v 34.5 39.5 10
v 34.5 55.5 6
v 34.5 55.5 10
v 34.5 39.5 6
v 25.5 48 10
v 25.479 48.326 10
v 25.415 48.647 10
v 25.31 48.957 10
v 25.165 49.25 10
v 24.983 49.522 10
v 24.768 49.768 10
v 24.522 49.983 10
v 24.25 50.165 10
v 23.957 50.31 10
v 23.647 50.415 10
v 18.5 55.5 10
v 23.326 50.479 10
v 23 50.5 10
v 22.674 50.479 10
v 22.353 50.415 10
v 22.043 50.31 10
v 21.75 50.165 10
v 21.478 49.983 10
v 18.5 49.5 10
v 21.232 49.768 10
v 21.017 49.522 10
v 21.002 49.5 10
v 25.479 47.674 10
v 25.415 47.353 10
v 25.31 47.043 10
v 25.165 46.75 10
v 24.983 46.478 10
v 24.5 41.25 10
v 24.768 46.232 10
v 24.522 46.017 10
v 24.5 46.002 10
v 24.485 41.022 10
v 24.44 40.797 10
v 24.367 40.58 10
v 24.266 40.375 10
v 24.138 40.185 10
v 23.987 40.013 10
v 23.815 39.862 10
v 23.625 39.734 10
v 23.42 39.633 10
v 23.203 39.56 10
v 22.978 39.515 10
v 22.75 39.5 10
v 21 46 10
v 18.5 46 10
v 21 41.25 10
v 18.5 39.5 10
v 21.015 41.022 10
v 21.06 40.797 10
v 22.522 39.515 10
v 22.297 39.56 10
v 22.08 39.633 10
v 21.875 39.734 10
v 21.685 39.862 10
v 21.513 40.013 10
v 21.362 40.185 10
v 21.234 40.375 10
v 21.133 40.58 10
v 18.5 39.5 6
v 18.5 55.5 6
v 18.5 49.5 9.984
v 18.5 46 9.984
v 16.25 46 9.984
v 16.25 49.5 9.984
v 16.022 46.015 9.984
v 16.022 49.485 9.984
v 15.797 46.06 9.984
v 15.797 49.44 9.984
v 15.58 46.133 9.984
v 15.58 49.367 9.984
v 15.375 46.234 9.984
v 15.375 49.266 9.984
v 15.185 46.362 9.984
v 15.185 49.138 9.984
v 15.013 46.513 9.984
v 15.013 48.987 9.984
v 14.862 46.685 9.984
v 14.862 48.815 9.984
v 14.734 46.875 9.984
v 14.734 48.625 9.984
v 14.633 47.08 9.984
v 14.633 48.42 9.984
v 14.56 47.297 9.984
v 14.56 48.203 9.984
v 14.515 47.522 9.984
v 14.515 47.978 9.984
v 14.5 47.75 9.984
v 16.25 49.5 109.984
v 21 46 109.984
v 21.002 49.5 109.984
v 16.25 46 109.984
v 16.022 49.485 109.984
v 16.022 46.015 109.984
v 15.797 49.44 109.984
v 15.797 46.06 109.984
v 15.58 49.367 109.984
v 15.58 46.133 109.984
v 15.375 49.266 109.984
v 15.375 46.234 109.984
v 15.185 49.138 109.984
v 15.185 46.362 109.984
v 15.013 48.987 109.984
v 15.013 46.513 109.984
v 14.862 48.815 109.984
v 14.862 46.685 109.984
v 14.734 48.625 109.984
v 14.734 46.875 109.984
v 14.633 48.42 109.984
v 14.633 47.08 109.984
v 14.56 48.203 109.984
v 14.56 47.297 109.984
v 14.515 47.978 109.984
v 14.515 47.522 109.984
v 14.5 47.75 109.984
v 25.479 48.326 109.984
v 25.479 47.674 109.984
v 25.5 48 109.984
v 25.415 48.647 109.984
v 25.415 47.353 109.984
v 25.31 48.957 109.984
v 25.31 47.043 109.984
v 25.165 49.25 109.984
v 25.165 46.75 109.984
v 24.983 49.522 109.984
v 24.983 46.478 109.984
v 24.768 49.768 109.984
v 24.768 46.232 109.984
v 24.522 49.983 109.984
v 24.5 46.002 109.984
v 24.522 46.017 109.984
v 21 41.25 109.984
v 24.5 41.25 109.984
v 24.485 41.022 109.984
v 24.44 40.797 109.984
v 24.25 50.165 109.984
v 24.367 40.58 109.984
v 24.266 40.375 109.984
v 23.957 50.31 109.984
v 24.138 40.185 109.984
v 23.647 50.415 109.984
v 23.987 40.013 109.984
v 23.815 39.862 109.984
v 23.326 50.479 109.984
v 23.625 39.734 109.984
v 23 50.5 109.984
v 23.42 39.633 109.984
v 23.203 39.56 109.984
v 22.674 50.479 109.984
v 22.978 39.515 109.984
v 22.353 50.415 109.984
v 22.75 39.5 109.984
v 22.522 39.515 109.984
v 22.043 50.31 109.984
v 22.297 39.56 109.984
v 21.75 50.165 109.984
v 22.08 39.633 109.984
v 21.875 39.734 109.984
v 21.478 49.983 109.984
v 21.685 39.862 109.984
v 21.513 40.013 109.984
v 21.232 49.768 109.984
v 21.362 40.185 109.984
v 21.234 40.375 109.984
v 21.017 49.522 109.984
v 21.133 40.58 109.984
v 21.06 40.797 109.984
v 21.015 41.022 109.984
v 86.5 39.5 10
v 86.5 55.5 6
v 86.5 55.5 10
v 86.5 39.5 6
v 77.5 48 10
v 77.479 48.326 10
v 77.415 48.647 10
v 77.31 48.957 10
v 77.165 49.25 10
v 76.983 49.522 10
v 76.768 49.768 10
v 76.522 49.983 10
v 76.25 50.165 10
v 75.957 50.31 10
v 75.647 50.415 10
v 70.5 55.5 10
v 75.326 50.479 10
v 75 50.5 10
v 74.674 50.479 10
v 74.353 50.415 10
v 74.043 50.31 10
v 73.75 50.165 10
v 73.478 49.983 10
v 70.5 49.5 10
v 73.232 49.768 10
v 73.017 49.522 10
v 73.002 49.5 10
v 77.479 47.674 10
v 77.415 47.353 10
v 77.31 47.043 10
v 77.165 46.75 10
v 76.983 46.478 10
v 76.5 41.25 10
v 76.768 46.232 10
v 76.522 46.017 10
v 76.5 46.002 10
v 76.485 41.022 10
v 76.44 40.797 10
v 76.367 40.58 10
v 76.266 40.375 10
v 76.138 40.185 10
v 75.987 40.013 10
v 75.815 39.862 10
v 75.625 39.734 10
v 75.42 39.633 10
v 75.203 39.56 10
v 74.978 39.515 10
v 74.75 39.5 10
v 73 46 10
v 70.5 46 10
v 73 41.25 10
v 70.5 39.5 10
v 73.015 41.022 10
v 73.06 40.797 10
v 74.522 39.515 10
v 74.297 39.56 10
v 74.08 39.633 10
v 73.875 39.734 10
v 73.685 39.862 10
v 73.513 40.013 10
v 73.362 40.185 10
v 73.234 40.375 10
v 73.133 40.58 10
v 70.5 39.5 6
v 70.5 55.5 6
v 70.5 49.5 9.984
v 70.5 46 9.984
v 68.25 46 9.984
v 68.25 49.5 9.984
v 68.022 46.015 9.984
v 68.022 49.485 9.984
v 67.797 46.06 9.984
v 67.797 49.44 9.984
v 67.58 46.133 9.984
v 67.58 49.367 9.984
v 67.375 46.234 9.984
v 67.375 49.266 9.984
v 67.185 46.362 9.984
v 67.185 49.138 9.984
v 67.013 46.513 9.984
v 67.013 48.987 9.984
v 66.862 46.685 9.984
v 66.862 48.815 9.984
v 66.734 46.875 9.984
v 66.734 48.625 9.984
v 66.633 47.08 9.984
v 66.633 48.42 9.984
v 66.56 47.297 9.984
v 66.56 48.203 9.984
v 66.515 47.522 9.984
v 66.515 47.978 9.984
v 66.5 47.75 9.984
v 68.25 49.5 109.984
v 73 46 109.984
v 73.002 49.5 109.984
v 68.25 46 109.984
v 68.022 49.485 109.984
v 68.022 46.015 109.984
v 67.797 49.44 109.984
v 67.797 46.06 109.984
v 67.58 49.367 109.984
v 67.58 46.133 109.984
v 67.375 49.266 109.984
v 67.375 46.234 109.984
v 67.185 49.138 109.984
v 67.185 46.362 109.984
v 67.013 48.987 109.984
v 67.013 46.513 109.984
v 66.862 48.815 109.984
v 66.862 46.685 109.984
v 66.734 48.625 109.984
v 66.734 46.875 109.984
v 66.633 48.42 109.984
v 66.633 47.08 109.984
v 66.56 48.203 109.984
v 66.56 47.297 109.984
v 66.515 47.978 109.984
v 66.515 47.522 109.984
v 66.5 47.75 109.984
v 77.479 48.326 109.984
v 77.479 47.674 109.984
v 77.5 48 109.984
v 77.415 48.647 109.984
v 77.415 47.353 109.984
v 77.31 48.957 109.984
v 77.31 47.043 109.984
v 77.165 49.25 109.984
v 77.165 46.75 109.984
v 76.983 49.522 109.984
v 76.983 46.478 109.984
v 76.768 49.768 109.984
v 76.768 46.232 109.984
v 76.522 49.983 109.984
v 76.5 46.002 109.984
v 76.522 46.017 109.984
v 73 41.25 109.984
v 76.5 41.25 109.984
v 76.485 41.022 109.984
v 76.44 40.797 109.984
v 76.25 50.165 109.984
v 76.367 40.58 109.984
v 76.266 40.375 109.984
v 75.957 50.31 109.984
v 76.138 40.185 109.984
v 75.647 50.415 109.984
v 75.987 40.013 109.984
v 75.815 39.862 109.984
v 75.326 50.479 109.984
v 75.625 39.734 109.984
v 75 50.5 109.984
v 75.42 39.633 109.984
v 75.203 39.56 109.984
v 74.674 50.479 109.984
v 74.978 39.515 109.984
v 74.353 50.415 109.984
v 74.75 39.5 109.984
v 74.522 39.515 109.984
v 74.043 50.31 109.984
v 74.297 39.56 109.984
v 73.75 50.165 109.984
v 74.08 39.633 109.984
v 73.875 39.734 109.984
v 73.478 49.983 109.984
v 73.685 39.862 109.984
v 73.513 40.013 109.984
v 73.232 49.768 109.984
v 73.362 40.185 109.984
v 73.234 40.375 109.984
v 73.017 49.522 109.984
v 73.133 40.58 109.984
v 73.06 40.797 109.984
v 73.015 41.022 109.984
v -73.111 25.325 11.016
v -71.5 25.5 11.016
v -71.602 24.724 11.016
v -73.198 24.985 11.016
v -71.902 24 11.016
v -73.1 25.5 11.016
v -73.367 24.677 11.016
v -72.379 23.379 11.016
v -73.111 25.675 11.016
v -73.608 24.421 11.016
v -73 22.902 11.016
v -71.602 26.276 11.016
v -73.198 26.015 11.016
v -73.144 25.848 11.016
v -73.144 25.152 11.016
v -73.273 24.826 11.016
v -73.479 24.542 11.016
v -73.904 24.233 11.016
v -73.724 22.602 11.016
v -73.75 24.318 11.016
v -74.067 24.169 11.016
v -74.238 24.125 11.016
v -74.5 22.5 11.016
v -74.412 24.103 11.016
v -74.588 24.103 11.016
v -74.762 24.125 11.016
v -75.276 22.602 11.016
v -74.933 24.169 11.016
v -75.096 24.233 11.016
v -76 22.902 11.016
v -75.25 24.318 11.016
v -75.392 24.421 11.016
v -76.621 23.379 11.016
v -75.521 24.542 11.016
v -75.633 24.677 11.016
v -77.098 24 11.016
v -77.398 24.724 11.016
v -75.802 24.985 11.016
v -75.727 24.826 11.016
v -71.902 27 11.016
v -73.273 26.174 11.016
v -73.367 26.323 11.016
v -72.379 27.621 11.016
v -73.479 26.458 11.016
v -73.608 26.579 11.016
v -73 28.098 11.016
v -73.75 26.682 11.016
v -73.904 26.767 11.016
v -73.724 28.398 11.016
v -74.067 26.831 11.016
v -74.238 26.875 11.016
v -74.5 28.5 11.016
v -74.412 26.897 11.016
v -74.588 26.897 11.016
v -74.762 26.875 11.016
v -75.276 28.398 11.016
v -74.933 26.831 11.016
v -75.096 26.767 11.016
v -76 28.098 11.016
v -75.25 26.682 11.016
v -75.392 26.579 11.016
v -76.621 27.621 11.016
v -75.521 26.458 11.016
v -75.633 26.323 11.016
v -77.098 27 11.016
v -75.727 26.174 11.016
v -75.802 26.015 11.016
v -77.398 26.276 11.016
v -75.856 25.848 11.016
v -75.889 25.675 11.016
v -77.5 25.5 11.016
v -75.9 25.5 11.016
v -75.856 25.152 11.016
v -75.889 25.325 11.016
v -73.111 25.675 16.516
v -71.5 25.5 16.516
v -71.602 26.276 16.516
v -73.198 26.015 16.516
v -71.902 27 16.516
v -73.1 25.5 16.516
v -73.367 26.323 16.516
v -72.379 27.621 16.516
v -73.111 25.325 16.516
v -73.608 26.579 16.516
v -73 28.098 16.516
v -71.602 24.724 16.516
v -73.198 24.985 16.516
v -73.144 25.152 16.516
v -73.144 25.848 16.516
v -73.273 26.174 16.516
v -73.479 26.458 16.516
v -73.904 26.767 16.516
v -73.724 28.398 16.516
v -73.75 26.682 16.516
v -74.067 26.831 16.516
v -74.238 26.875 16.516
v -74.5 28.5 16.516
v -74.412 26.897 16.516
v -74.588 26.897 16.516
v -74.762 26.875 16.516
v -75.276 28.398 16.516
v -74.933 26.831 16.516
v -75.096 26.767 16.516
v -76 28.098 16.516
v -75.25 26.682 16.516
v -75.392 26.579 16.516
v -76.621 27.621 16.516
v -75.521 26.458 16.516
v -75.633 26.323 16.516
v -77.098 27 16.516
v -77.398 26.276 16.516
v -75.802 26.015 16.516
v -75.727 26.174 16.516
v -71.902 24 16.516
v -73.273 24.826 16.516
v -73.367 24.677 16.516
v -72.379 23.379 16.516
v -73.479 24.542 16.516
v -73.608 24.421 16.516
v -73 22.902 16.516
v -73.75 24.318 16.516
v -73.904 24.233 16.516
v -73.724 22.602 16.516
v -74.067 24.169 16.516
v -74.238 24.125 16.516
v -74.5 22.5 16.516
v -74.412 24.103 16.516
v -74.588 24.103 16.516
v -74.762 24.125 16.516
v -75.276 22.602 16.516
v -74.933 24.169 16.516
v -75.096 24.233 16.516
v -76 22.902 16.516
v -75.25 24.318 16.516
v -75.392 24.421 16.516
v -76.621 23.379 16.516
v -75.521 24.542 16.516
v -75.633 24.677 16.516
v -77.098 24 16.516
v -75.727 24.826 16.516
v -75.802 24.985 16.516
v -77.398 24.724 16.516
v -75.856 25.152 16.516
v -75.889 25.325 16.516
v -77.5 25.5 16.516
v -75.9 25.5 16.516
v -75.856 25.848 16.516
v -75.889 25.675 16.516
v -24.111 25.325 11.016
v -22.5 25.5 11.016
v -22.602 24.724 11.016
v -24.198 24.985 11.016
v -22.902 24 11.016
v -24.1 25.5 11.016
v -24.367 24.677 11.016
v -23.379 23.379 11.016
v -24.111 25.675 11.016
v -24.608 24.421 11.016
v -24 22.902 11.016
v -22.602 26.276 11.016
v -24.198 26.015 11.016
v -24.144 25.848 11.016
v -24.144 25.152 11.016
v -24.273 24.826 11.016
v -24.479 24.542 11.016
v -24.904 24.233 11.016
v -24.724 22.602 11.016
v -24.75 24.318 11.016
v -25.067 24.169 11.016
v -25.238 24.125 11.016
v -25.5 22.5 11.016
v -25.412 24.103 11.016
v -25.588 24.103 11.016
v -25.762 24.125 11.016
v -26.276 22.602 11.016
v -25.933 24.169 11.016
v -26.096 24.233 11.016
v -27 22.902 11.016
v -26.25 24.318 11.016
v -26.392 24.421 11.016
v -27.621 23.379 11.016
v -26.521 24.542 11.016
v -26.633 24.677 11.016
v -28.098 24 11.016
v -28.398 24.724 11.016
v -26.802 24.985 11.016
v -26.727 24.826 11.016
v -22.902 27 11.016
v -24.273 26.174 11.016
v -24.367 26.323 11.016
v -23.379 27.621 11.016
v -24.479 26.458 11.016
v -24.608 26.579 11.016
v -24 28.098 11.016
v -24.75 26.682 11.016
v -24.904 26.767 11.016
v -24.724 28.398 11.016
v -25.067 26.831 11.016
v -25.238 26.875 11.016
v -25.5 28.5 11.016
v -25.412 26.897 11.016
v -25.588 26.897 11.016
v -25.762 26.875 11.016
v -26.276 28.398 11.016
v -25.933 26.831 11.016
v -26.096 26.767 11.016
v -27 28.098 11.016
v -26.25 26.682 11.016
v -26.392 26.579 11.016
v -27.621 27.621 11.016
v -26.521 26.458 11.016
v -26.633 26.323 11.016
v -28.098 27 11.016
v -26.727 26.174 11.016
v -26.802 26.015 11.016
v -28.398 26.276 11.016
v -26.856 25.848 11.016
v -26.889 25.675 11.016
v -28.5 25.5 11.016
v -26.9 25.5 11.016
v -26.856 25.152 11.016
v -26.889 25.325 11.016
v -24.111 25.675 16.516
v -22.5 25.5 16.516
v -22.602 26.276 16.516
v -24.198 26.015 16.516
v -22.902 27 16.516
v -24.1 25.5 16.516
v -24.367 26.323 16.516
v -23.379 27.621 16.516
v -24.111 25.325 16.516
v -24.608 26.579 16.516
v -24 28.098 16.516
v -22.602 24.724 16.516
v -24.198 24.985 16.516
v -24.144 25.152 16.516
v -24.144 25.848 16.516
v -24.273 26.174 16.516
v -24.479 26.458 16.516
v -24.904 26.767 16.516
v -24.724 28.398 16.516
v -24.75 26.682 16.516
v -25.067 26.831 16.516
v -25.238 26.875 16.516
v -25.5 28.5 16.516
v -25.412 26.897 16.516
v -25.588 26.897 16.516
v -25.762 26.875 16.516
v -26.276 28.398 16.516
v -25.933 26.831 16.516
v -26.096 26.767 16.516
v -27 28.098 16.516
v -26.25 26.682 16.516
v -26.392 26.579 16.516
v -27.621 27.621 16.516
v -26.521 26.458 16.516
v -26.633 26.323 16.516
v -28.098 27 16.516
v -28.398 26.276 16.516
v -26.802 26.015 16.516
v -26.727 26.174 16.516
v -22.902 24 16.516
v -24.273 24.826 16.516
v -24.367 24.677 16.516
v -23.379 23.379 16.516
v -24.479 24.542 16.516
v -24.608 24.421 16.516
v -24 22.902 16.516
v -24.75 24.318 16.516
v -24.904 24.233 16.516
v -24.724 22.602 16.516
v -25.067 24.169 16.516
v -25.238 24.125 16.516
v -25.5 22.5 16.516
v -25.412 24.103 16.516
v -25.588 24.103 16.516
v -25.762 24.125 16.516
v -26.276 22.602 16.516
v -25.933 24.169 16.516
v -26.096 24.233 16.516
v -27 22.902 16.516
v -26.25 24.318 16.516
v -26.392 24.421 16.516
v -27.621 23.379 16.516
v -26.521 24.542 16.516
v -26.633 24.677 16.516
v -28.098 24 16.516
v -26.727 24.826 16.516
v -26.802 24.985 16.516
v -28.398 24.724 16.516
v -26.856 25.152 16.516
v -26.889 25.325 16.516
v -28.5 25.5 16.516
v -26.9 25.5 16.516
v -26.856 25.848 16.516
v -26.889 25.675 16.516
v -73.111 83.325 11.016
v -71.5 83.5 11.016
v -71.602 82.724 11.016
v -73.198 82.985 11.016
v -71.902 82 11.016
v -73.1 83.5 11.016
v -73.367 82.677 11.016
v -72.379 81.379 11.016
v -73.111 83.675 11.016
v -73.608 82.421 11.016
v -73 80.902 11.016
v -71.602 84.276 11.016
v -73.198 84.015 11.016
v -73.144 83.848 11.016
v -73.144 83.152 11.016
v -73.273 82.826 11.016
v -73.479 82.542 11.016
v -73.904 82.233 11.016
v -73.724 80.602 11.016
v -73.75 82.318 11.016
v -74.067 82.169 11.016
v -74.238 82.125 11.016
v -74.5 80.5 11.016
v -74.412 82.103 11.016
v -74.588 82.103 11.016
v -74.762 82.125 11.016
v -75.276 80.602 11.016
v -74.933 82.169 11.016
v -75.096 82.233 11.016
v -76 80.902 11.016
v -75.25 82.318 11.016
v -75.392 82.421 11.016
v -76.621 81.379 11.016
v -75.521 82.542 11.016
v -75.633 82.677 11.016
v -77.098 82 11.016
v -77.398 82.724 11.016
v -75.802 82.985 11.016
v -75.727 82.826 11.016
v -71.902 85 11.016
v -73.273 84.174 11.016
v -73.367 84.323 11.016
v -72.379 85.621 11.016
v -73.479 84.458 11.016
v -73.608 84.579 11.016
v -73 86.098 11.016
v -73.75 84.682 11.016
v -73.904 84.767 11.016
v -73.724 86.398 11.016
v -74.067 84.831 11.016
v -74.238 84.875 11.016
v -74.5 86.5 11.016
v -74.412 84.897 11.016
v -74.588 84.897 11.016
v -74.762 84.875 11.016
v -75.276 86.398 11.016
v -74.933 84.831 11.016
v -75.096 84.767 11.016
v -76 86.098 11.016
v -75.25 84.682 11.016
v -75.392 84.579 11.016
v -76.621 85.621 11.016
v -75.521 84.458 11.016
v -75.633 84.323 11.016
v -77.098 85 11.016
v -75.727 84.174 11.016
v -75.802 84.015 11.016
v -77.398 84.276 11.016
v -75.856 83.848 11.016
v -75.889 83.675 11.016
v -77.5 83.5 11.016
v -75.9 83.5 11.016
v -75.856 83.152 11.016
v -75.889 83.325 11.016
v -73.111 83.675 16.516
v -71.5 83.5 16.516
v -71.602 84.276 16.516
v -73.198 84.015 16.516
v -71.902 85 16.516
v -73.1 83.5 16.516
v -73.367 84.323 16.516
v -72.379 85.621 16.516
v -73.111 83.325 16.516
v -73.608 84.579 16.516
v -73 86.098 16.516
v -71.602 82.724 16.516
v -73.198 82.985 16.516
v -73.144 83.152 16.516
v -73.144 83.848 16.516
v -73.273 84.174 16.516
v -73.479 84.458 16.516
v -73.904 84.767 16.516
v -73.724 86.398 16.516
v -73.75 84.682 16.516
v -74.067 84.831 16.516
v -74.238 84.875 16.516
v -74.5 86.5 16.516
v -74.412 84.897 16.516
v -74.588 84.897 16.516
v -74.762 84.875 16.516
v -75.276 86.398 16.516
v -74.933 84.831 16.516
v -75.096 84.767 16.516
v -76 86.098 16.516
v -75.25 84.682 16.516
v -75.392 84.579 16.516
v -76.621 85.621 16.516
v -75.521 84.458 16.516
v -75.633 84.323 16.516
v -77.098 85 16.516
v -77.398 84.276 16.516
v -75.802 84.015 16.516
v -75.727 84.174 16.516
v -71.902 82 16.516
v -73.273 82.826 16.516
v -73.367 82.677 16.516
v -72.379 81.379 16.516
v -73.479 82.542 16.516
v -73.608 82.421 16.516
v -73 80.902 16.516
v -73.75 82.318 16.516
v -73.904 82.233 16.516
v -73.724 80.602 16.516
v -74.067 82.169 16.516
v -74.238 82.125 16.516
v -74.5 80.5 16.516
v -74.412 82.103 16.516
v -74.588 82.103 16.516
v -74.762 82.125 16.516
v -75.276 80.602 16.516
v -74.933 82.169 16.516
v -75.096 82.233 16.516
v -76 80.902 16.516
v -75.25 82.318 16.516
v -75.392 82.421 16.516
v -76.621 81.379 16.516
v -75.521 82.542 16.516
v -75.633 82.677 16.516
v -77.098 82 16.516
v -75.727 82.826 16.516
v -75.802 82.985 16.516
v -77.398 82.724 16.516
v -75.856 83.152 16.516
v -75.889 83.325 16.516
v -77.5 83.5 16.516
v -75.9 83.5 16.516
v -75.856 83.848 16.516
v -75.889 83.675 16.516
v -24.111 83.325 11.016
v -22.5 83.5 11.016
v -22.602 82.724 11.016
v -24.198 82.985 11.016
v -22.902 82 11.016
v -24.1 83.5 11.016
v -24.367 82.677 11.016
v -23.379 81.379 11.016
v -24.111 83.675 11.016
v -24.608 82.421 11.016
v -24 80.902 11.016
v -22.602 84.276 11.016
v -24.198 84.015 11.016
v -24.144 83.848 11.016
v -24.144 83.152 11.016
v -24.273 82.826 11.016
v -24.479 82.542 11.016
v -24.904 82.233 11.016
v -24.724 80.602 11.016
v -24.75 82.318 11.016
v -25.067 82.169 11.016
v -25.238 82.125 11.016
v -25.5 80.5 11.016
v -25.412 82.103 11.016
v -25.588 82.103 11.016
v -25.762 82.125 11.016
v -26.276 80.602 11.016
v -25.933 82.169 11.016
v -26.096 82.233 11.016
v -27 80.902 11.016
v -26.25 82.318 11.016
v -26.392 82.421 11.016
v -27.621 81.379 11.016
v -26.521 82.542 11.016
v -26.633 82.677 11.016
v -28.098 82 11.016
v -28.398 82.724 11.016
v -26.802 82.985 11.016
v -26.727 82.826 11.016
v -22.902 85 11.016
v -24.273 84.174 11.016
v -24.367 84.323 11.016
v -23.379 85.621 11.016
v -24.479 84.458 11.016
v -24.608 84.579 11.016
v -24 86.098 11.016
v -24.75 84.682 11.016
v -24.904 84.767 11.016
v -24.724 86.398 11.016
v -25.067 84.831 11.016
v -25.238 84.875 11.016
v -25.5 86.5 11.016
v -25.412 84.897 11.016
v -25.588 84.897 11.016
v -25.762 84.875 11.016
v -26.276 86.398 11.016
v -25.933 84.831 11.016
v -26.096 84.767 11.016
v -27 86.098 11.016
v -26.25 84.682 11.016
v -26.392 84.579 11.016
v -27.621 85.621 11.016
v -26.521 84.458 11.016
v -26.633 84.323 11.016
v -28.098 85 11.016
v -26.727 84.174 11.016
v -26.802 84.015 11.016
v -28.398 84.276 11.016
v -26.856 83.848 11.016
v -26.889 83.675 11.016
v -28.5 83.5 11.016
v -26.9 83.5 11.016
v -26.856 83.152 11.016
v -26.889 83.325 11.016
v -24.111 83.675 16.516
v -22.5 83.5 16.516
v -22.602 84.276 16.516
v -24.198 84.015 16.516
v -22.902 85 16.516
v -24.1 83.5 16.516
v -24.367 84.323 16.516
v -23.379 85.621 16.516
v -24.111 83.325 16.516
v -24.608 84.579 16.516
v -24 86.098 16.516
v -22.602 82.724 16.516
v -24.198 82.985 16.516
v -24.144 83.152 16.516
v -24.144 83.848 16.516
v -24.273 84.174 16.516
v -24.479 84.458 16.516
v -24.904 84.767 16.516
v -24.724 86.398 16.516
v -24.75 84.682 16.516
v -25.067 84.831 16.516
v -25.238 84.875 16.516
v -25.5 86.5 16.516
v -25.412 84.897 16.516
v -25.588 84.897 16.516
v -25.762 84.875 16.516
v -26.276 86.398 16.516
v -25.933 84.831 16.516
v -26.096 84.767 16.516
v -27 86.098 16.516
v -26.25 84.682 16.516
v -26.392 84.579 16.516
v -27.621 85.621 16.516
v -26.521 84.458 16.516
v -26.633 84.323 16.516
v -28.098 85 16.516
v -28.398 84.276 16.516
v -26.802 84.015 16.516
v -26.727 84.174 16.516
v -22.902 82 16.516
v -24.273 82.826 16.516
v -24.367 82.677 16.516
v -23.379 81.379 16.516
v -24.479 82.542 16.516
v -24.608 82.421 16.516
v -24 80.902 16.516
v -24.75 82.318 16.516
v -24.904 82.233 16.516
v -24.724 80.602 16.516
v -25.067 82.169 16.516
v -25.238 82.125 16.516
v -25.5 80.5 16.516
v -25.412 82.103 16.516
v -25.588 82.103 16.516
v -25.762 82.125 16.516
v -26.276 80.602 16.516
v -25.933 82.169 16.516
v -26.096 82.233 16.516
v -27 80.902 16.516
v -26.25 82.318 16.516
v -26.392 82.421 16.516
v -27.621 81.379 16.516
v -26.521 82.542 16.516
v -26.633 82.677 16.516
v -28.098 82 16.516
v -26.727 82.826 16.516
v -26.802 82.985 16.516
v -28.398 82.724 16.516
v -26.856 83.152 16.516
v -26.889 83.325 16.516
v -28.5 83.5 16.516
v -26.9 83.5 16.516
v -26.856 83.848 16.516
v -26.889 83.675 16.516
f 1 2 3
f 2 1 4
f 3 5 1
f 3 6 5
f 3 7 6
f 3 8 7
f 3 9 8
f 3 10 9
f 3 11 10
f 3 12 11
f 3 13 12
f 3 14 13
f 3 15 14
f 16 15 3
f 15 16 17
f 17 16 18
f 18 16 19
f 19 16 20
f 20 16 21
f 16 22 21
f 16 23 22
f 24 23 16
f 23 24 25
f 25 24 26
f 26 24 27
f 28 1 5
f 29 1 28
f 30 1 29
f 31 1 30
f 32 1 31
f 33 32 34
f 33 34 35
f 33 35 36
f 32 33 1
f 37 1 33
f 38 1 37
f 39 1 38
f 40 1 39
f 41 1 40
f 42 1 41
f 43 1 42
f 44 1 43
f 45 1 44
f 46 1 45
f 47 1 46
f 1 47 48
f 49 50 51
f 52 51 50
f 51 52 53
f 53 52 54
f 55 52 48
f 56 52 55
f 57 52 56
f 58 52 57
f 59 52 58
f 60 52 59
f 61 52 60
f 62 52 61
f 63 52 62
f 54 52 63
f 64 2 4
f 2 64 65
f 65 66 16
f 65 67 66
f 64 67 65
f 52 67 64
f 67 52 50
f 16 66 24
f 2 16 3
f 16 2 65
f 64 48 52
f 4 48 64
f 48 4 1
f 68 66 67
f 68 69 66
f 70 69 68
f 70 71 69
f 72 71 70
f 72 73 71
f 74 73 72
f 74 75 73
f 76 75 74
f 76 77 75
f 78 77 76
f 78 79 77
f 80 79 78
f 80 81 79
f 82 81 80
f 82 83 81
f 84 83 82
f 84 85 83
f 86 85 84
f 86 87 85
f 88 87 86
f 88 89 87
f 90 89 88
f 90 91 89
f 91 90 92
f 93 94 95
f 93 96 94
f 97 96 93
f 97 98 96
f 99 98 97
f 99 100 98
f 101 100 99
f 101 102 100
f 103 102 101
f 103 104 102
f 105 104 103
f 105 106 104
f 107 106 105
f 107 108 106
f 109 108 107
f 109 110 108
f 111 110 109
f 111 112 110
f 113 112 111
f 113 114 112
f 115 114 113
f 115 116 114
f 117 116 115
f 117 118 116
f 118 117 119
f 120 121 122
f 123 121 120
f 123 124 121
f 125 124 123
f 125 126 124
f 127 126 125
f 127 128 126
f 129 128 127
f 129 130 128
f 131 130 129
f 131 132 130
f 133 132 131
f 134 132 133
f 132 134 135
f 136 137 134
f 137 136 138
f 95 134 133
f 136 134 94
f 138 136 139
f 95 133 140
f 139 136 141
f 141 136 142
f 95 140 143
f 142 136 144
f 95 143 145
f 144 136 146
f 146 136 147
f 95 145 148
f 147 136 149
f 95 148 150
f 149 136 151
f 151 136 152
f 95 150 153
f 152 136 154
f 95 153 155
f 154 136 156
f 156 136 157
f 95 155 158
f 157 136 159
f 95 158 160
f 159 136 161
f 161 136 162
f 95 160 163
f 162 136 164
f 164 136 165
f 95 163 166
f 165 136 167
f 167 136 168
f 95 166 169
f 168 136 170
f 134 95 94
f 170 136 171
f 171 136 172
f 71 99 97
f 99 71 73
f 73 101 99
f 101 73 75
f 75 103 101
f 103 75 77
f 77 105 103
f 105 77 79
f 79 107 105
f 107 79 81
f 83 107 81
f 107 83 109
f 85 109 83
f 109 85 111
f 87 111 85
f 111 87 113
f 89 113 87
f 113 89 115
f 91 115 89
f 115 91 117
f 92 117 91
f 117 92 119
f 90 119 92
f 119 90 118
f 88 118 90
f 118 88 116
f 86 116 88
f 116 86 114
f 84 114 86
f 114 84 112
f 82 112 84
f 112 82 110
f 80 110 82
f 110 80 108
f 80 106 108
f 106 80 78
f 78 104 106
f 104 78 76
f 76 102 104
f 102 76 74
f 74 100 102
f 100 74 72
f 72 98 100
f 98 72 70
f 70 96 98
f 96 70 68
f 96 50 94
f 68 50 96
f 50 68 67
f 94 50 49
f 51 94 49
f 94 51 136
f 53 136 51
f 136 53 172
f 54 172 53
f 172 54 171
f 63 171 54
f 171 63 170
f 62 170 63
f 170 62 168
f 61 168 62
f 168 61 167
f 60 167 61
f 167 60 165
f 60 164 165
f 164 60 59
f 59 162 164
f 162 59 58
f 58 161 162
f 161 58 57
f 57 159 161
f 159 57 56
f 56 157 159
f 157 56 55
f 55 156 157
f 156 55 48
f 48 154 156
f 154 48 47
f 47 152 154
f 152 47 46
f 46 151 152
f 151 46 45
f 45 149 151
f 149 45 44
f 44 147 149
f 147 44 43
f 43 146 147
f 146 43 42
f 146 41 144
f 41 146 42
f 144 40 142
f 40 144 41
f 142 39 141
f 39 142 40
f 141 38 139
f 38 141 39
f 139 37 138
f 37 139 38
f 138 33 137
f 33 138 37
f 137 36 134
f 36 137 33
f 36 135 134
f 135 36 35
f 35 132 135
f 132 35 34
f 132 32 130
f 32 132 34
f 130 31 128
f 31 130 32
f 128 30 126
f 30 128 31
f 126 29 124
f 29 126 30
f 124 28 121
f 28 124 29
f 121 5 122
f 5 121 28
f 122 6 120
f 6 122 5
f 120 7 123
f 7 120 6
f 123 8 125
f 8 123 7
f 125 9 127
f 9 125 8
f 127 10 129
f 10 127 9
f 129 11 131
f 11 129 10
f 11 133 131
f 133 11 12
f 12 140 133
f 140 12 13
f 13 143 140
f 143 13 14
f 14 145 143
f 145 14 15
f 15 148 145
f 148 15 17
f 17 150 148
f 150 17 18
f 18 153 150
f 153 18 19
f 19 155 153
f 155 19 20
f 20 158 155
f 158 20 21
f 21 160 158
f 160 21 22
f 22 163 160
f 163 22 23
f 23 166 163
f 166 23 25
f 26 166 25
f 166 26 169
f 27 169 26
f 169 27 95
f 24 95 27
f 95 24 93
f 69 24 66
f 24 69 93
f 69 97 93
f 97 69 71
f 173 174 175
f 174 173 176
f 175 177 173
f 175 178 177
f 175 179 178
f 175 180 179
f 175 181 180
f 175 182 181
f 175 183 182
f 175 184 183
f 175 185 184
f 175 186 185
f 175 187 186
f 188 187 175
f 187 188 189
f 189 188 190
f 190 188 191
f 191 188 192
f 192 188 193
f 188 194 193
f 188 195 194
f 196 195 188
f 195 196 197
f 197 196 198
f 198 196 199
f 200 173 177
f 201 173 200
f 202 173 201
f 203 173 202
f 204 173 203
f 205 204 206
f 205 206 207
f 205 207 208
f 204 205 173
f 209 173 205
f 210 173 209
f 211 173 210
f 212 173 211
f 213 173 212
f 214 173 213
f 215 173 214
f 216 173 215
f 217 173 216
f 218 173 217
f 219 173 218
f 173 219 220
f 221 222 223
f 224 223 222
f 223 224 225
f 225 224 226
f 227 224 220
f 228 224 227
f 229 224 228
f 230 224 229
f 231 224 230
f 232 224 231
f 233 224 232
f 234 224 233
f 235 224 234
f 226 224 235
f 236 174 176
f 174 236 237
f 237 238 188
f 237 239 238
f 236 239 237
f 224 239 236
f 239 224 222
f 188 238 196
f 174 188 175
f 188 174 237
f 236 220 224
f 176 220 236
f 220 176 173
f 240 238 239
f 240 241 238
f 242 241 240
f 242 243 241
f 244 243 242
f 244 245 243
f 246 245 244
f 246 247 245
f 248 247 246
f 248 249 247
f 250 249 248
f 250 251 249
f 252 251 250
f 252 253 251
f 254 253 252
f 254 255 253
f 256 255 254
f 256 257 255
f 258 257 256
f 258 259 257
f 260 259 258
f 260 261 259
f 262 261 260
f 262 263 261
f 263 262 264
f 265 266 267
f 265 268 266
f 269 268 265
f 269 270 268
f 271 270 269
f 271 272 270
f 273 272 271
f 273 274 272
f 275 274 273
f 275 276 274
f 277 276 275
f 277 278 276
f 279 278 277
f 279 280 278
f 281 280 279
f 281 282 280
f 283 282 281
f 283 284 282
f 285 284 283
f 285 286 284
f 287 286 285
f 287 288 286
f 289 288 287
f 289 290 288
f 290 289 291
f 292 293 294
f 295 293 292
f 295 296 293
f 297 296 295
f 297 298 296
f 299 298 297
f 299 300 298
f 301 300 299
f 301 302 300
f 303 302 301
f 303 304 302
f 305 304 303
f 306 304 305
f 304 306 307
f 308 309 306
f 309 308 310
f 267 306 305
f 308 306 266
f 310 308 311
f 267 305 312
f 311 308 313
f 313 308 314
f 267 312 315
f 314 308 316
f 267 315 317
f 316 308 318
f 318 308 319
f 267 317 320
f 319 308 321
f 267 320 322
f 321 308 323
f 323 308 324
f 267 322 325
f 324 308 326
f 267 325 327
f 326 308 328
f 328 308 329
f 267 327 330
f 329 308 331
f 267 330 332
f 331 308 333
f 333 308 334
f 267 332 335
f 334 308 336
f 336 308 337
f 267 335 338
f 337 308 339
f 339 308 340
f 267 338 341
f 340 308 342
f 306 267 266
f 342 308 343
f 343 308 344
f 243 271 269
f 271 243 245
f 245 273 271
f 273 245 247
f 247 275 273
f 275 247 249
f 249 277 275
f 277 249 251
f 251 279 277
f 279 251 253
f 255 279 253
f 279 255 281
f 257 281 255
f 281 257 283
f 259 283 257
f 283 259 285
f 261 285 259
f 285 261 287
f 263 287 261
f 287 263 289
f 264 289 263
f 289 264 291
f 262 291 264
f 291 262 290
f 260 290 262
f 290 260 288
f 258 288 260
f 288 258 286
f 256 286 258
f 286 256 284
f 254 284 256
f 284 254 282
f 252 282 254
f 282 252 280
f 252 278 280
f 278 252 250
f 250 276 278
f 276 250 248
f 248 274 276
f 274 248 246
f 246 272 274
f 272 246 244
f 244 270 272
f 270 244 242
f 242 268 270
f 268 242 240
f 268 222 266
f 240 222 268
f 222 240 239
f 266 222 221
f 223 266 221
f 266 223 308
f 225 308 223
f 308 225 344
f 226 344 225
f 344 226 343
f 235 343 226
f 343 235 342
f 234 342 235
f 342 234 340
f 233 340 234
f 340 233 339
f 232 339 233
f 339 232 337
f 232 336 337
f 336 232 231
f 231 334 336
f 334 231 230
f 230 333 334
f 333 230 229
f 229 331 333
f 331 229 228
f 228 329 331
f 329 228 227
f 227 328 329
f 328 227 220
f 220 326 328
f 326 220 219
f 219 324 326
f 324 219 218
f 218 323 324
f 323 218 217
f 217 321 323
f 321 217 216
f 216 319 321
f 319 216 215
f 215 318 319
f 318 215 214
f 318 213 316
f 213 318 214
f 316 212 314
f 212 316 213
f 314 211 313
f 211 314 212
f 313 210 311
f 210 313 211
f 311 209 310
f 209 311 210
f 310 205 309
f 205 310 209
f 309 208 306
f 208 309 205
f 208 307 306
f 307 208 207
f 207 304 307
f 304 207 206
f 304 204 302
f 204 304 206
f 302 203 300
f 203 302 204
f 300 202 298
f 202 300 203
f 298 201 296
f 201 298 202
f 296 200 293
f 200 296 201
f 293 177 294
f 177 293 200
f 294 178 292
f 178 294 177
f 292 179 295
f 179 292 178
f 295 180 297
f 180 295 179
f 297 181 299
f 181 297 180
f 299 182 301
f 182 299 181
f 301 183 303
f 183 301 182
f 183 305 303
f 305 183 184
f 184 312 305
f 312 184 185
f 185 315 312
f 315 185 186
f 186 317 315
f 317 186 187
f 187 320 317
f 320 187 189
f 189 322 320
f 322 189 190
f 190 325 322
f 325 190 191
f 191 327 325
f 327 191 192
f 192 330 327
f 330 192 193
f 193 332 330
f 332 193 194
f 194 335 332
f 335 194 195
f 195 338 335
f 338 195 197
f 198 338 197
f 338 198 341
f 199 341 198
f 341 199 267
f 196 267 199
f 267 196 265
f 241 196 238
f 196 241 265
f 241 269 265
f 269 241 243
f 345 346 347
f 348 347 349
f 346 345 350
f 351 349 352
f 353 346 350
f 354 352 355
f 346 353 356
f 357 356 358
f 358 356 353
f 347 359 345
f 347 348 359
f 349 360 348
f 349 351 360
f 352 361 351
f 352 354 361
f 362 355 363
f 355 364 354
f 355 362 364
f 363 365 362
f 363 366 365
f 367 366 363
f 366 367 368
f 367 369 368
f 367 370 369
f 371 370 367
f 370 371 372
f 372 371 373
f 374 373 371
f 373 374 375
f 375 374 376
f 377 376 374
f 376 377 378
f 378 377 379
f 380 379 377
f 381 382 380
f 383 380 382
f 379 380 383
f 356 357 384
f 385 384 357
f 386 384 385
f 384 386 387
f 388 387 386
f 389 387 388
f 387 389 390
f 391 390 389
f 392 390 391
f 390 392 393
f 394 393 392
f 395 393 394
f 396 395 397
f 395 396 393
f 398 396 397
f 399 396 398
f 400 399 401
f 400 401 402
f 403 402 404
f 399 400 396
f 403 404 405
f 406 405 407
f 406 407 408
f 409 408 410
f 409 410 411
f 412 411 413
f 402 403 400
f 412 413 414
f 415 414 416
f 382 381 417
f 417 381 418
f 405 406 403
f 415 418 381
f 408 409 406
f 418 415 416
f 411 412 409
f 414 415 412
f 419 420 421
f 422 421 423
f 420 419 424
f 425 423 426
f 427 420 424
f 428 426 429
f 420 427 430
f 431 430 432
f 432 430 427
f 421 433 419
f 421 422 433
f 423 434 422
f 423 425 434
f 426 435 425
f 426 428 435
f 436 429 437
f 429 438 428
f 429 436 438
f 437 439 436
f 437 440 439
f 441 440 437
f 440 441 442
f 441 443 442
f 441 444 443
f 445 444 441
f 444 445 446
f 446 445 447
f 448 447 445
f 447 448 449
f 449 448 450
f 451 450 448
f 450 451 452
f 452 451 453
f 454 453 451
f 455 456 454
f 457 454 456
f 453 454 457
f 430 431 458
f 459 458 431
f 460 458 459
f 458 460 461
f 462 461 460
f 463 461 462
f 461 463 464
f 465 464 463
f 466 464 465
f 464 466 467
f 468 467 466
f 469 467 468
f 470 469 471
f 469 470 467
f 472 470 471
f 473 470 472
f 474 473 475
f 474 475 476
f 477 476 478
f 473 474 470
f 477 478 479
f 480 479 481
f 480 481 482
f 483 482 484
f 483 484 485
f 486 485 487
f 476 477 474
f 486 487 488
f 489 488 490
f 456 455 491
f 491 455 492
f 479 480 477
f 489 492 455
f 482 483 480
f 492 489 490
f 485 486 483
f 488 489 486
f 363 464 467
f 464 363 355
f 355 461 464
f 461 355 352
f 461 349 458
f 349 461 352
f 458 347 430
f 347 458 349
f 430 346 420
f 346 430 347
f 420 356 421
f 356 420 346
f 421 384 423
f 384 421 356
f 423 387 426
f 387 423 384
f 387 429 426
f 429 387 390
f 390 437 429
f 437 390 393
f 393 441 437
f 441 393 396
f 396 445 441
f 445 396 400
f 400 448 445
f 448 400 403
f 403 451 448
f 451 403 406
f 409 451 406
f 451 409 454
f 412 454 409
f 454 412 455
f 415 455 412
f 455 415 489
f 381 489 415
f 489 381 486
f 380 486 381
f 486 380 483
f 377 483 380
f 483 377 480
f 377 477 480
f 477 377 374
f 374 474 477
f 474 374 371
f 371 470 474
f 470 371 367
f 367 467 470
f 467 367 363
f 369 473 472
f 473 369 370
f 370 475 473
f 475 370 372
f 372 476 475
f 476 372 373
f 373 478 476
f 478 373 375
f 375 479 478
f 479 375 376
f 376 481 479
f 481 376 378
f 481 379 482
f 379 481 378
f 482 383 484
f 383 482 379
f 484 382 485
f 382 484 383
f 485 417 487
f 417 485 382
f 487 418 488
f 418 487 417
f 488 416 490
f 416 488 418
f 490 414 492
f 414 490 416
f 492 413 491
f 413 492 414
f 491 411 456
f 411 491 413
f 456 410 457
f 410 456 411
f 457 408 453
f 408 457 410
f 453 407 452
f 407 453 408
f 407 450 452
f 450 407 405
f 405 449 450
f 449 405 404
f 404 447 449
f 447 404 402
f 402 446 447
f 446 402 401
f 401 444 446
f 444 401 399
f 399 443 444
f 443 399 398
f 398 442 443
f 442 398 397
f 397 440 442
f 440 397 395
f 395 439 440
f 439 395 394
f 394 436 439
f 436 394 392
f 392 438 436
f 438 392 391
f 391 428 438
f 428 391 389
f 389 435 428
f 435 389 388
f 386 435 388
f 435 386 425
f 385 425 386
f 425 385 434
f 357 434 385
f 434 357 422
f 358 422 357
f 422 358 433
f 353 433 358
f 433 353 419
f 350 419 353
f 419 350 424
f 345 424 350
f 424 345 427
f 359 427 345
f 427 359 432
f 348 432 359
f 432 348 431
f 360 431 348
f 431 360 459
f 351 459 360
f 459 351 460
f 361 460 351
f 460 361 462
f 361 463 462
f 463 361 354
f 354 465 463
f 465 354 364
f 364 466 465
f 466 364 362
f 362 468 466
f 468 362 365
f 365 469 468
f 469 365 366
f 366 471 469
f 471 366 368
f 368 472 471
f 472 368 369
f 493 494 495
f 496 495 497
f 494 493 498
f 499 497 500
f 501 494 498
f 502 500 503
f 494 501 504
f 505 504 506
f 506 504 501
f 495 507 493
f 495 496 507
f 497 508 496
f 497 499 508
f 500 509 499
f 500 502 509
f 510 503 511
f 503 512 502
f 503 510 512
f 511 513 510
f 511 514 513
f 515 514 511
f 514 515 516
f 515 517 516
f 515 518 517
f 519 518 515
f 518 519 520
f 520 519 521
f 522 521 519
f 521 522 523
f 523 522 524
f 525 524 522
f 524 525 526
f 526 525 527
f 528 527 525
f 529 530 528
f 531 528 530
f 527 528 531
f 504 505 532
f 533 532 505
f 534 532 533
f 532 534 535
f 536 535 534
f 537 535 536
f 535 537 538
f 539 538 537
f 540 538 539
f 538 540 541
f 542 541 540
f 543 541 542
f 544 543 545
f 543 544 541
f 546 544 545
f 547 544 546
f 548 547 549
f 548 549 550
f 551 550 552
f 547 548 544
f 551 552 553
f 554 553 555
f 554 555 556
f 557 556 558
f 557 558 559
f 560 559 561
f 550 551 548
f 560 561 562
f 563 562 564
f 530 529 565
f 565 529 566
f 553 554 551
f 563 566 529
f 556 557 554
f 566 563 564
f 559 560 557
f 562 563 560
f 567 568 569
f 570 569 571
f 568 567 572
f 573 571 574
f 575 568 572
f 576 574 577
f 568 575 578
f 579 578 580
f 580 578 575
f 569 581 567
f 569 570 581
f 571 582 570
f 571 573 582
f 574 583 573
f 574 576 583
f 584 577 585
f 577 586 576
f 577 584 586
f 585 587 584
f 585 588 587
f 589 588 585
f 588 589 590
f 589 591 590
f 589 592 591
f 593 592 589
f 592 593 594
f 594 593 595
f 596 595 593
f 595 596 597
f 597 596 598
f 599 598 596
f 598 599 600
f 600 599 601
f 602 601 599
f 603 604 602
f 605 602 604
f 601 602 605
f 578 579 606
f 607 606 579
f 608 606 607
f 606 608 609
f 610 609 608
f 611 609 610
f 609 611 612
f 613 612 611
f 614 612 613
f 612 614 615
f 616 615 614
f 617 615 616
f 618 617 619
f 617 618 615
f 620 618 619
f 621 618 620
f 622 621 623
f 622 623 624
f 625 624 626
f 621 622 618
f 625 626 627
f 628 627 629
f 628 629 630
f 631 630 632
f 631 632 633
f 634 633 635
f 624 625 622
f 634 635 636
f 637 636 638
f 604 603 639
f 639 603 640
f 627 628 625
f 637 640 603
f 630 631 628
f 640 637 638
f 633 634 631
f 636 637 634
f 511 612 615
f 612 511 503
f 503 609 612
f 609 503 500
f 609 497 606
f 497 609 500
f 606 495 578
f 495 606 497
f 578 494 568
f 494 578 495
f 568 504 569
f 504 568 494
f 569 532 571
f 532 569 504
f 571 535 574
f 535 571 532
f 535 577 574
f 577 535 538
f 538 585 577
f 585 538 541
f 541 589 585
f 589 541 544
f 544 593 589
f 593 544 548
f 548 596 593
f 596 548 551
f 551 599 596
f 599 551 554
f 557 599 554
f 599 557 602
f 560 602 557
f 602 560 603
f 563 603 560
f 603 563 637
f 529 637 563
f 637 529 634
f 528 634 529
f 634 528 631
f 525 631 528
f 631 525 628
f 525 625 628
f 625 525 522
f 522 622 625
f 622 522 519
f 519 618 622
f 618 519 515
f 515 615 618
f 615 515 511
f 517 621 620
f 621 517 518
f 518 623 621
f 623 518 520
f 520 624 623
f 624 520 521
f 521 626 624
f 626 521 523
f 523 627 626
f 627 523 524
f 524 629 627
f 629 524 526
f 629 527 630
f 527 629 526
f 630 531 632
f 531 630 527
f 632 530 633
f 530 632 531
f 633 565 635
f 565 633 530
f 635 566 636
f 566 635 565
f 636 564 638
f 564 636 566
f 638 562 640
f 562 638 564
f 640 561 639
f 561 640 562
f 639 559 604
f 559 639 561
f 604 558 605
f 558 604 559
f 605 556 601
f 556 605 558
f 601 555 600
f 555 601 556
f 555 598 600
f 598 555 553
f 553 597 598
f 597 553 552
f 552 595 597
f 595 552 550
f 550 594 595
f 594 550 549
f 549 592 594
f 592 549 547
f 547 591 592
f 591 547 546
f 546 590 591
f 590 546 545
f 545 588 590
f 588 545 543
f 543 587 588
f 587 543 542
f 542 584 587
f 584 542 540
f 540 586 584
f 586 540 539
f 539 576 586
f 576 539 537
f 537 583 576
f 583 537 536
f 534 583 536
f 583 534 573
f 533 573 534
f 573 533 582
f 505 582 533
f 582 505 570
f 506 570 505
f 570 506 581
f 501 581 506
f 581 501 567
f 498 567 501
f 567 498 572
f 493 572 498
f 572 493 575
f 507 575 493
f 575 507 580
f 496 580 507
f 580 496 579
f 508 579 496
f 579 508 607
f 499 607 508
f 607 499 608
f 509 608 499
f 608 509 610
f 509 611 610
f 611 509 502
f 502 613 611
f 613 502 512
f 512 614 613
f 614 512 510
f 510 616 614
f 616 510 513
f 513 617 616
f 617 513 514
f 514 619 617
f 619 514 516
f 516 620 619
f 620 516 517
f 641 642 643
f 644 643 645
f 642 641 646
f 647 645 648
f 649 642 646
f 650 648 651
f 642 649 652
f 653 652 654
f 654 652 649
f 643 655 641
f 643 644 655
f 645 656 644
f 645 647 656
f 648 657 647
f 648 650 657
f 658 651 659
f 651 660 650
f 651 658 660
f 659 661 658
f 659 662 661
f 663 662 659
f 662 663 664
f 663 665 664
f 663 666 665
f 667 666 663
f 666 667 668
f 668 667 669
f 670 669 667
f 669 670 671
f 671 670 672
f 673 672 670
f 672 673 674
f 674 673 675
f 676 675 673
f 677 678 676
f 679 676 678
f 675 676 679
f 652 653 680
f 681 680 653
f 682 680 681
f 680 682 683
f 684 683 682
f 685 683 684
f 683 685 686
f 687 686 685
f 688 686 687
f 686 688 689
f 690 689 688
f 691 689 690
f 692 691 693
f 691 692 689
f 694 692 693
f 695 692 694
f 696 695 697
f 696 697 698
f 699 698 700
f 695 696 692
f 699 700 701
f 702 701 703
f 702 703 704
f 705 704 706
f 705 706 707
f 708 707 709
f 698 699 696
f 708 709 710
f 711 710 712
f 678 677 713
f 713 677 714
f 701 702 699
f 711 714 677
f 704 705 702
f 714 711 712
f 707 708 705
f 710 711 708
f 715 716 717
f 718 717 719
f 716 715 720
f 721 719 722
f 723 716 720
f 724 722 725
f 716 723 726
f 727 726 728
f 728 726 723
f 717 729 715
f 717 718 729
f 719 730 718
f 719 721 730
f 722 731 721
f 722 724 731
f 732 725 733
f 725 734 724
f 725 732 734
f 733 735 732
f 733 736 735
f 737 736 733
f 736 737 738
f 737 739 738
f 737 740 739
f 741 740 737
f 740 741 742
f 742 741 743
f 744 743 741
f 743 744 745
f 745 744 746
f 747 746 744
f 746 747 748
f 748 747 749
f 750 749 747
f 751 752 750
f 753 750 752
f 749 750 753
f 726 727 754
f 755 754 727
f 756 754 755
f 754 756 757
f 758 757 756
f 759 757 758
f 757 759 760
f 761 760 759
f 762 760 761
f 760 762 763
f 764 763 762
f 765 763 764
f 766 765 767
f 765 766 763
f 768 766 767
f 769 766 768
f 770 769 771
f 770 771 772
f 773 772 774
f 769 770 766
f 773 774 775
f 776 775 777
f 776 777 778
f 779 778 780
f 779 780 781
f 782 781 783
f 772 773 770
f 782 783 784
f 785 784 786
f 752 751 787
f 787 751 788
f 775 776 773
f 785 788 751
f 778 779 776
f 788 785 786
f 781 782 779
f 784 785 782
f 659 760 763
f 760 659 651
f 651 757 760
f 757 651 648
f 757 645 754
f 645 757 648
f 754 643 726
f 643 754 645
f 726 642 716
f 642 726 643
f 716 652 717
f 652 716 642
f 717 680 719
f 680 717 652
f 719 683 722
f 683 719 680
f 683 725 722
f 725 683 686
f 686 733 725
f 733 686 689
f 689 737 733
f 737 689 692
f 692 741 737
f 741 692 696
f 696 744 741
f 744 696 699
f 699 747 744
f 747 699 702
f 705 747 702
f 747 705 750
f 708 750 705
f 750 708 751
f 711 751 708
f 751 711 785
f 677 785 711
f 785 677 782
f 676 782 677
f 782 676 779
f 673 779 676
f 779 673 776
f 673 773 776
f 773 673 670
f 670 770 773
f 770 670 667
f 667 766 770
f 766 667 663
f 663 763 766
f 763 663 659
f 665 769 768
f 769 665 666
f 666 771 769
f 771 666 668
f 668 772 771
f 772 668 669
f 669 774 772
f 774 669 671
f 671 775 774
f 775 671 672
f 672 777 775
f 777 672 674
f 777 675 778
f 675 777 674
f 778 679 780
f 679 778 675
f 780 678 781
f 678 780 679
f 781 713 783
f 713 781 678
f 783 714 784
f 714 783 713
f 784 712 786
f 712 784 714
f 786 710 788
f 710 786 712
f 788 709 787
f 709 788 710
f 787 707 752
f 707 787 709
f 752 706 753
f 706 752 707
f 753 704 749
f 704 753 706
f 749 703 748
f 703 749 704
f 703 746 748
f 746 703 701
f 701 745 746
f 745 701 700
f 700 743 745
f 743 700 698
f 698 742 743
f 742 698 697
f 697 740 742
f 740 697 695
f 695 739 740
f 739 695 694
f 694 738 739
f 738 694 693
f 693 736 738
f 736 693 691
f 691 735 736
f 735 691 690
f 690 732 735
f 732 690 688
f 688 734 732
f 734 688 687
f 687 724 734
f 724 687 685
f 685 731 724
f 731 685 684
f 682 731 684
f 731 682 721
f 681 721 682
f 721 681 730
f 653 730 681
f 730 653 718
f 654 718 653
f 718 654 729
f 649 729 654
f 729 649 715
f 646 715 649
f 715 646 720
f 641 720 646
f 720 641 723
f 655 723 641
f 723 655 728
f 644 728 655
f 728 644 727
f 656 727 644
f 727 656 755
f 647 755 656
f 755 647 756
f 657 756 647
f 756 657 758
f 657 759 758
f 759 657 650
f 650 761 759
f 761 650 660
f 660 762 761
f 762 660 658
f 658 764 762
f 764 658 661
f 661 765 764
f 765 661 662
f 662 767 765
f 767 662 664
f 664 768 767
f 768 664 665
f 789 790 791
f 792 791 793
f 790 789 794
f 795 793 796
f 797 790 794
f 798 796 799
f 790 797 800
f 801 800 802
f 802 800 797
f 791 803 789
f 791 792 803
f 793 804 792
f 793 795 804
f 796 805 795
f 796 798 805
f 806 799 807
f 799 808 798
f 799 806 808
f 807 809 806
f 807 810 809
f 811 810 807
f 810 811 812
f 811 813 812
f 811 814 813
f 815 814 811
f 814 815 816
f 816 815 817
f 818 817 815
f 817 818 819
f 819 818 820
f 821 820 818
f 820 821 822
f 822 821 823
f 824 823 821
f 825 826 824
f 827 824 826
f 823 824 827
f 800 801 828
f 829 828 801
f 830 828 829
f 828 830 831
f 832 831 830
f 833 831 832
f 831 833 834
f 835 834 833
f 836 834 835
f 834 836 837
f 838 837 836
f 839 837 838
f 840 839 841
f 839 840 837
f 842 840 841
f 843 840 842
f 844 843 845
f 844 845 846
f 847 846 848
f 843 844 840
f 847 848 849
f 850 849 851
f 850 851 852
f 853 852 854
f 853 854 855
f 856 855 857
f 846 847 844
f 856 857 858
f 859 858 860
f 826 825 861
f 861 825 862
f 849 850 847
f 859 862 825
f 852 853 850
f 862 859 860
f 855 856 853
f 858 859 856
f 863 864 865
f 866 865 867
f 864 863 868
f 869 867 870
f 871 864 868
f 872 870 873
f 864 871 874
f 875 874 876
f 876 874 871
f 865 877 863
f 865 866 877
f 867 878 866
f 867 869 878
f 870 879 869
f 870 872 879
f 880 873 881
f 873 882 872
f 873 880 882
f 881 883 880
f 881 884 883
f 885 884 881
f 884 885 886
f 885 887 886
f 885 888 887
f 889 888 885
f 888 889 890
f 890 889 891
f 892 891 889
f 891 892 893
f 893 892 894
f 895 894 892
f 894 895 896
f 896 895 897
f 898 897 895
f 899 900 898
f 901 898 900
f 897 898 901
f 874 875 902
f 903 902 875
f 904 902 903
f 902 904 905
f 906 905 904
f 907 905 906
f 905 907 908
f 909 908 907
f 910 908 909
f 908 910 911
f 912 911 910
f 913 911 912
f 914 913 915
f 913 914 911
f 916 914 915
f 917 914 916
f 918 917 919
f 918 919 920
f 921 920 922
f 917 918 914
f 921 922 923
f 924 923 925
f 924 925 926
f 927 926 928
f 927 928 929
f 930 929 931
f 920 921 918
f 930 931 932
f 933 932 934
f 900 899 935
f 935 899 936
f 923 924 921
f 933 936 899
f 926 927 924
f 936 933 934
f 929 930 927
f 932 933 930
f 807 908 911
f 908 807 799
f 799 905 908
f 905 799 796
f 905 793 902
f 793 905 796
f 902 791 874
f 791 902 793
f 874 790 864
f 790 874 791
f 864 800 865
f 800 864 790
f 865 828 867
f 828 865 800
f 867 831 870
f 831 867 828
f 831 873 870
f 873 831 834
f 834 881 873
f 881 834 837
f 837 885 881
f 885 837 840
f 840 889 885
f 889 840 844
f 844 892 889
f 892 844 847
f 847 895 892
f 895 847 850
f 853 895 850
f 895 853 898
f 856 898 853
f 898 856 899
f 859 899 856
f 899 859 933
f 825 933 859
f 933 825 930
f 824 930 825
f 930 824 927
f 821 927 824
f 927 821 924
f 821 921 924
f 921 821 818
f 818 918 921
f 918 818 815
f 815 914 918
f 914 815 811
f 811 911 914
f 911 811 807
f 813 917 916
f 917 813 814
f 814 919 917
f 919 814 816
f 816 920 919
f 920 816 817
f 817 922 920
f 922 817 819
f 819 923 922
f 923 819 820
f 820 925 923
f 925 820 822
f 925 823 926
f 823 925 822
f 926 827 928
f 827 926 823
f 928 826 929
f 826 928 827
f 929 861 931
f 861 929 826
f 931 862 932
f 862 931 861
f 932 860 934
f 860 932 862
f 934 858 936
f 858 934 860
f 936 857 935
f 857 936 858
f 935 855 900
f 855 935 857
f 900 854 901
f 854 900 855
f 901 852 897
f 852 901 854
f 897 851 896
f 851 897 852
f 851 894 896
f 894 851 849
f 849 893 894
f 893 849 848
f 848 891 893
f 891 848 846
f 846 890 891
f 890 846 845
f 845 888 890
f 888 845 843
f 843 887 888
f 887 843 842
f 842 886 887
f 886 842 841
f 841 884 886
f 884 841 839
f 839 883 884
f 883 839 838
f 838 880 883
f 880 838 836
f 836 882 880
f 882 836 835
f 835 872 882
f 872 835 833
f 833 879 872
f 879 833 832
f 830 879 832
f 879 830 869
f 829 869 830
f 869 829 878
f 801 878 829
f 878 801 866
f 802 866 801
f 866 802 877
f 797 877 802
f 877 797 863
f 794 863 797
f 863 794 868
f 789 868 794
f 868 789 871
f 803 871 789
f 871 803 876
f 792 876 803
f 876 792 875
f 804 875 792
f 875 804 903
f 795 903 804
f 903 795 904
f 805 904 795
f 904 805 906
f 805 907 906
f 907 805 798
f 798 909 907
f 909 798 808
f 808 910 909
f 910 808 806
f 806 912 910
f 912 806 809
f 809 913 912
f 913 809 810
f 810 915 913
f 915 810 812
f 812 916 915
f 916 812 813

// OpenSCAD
// file: mounting.scad
e = 1/64;

slot_width = 4.0;
L_leg_length = 11; // possibly 12
extent_length = 14.0;

center_diameter = 8.5;


module ridge_outline () {

  both_inset = 0.5;
  inset = both_inset / 2;
  ridge_width = slot_width - 0.5;
  half_ridge_width = ridge_width / 2;

  L_vert_to_horiz_start = 6.5; // measured is 7.0

  ridge_center_radius = 5.0 / 2;

  rotate([0, 0, 180])
  union () {
    square([ridge_width, L_vert_to_horiz_start + half_ridge_width]);
    translate([half_ridge_width, L_vert_to_horiz_start + half_ridge_width]) {
      circle(d = ridge_width, $fn = 48);
    }

    square([L_vert_to_horiz_start + half_ridge_width, ridge_width]);
    translate([L_vert_to_horiz_start + half_ridge_width, half_ridge_width]) {
      circle(d = ridge_width, $fn = 48);
    }

    translate([-(ridge_center_radius - ridge_width) + both_inset,
               -(ridge_center_radius - ridge_width) + both_inset]) {
      circle(r = ridge_center_radius, $fn = 48);
    }
  }
}

module generate_ridge (height = 2.0 + 1.5) {

  linear_extrude(h = height) {
    ridge_outline();
  }

}


if (!true) {
  //ridge_outline();
  generate_ridge(height = 2.0 + 1.5 + 0.5);
 } else {

  h = 3;
  translate ([-3/2,-3/2,0]) cube([10 + 3, 10 + 3, h]);
  translate ([10, 10, h-e]) { generate_ridge(height = 2.0 + 1.5 + 0.5); }

 }
// main file
use <mounting.scad>

show_assembly = !true;

e = 1/64;

//rack_model = "./u1-10-inch-rack-mount-for-raspberry-pi-4-and-tl-sg105-model_files/1u-rack-raspberry-pi-4-model-b-and-tl-sg105-v6.stl";
rack_model = "./repaired-1u-rack-raspberry-pi-4-model-b-and-tl-sg105-v6.obj";

width = 100;
depth = 98.0;
height = 25;

slot_distance_from_front = 49.5;
distance_between_slots = 52.0;

rack_switch_elevation = 10;
fudge = 0.2;

module single_look() {

  intersection() {
    modified_import();
    //translate([0.5, 0, rack_switch_elevation + fudge]) %sg105_enclosure();
  }


  translate([0.5, 0, rack_switch_elevation]) %sg105_enclosure();

}

module modified_import () {

  honeycomb_thickness = 4.0;
  depth_cut_start = 18.0 - (true ? 3.0 : 0.0);
  depth_cut_extend = depth ;
  height_cut_extend = height + 10;

  sidewall_thickness = 4.0;
  mesh_area_length = 25.0 + 3.5;
  sidewall_cut_start = depth - mesh_area_length;

  difference () {
    translate([9.0 +0.5,0,0])
      rotate([-90,0,0])
      import(rack_model);

    // cut away above switch
    translate([0 + e, depth_cut_start, rack_switch_elevation+e])
      cube([0.5 + width + 0.5 -2*e, depth_cut_extend, height_cut_extend]);

    // cut rear sidwalls around cooling mesh in enclosure
    translate([0, sidewall_cut_start, rack_switch_elevation+e]) {

      translate([-honeycomb_thickness - e, 0, 0])
        cube([sidewall_thickness + 3*e, mesh_area_length + 6+e, height_cut_extend]);

      translate([0.5 + width + 0.5 - 2*e, 0, 0])
        cube([sidewall_thickness + 3*e, mesh_area_length + 6+e, height_cut_extend]);

    }


  }


  // position updated half crosses
  //x1 = 24.0;
  x1 = (width - distance_between_slots)/2;
  x2 = x1 + distance_between_slots;

  y = slot_distance_from_front;
  z = rack_switch_elevation-e;

  translate([x1 + 0.5, y, z]) mount_post();
  translate([x2 + 0.5, y, z]) mount_post();

  // shrink bores slightly on pi mount posts
  translate([-74.5, 25.5, 11+e]) pi_mount_bores();

}


module sg105_enclosure () {

  difference() {
  //color("darkblue")
    cube ([width, depth, height]);

    slot1_x = (width - distance_between_slots)/2;
    slot2_x = slot1_x + distance_between_slots;

    if (true) {
      //%translate([0,0,-3]) {
      translate([0, 0, -e]) {
        translate([slot1_x, slot_distance_from_front, 0]) {
          generate_ridge();
        }
        translate([slot2_x, slot_distance_from_front, 0]) {
          generate_ridge();
        }
    }
    }
  }

}


module mount_post () {

  support_height=4;
  support_leg = 16;
  union() {

    translate([2, -2, -(support_height/2)+e])
      rotate([0,0,0])
      cube([support_leg, support_leg, support_height], center = true);
    generate_ridge() {}
  }
}


module pi_mount_bore (height = 5.5) {

  linear_extrude(height = height, center = false, convexity = 10, twist = 0, slices = 20, scale = 1.0) {
    difference () {
      circle(r = 6/2, $fn = 24);
      circle(r = 2.8/2, $fn = 50);
    }
  }
}

module pi_mount_bores (height = 5.5) {

  x_spacing = 49;
  y_spacing = 58;

  translate(v = [0,0,0]) pi_mount_bore();
  translate(v = [x_spacing, 0, 0]) pi_mount_bore();
  translate(v = [0, y_spacing, 0]) pi_mount_bore();
  translate(v = [x_spacing, y_spacing, 0]) pi_mount_bore();

}

module tray_sled () {
 import ("raspberry-pi-rack-tray.stl");
}

module assembly() {
  import ("10-inch-rack-mount-for-raspberry-pi-4-and-tl-sg105e.stl");
  translate([0.5, 0, rack_switch_elevation]) color("darkblue") %sg105_enclosure();

  // shrink bores slightly on pi mount posts
  translate([-74.5, 25.5, 11+e]) %pi_mount_bores();

}

if (show_assembly) {
  assembly();
} else {
  single_look();
  //generate_ridge();
  //sg108_enclosure();


}
